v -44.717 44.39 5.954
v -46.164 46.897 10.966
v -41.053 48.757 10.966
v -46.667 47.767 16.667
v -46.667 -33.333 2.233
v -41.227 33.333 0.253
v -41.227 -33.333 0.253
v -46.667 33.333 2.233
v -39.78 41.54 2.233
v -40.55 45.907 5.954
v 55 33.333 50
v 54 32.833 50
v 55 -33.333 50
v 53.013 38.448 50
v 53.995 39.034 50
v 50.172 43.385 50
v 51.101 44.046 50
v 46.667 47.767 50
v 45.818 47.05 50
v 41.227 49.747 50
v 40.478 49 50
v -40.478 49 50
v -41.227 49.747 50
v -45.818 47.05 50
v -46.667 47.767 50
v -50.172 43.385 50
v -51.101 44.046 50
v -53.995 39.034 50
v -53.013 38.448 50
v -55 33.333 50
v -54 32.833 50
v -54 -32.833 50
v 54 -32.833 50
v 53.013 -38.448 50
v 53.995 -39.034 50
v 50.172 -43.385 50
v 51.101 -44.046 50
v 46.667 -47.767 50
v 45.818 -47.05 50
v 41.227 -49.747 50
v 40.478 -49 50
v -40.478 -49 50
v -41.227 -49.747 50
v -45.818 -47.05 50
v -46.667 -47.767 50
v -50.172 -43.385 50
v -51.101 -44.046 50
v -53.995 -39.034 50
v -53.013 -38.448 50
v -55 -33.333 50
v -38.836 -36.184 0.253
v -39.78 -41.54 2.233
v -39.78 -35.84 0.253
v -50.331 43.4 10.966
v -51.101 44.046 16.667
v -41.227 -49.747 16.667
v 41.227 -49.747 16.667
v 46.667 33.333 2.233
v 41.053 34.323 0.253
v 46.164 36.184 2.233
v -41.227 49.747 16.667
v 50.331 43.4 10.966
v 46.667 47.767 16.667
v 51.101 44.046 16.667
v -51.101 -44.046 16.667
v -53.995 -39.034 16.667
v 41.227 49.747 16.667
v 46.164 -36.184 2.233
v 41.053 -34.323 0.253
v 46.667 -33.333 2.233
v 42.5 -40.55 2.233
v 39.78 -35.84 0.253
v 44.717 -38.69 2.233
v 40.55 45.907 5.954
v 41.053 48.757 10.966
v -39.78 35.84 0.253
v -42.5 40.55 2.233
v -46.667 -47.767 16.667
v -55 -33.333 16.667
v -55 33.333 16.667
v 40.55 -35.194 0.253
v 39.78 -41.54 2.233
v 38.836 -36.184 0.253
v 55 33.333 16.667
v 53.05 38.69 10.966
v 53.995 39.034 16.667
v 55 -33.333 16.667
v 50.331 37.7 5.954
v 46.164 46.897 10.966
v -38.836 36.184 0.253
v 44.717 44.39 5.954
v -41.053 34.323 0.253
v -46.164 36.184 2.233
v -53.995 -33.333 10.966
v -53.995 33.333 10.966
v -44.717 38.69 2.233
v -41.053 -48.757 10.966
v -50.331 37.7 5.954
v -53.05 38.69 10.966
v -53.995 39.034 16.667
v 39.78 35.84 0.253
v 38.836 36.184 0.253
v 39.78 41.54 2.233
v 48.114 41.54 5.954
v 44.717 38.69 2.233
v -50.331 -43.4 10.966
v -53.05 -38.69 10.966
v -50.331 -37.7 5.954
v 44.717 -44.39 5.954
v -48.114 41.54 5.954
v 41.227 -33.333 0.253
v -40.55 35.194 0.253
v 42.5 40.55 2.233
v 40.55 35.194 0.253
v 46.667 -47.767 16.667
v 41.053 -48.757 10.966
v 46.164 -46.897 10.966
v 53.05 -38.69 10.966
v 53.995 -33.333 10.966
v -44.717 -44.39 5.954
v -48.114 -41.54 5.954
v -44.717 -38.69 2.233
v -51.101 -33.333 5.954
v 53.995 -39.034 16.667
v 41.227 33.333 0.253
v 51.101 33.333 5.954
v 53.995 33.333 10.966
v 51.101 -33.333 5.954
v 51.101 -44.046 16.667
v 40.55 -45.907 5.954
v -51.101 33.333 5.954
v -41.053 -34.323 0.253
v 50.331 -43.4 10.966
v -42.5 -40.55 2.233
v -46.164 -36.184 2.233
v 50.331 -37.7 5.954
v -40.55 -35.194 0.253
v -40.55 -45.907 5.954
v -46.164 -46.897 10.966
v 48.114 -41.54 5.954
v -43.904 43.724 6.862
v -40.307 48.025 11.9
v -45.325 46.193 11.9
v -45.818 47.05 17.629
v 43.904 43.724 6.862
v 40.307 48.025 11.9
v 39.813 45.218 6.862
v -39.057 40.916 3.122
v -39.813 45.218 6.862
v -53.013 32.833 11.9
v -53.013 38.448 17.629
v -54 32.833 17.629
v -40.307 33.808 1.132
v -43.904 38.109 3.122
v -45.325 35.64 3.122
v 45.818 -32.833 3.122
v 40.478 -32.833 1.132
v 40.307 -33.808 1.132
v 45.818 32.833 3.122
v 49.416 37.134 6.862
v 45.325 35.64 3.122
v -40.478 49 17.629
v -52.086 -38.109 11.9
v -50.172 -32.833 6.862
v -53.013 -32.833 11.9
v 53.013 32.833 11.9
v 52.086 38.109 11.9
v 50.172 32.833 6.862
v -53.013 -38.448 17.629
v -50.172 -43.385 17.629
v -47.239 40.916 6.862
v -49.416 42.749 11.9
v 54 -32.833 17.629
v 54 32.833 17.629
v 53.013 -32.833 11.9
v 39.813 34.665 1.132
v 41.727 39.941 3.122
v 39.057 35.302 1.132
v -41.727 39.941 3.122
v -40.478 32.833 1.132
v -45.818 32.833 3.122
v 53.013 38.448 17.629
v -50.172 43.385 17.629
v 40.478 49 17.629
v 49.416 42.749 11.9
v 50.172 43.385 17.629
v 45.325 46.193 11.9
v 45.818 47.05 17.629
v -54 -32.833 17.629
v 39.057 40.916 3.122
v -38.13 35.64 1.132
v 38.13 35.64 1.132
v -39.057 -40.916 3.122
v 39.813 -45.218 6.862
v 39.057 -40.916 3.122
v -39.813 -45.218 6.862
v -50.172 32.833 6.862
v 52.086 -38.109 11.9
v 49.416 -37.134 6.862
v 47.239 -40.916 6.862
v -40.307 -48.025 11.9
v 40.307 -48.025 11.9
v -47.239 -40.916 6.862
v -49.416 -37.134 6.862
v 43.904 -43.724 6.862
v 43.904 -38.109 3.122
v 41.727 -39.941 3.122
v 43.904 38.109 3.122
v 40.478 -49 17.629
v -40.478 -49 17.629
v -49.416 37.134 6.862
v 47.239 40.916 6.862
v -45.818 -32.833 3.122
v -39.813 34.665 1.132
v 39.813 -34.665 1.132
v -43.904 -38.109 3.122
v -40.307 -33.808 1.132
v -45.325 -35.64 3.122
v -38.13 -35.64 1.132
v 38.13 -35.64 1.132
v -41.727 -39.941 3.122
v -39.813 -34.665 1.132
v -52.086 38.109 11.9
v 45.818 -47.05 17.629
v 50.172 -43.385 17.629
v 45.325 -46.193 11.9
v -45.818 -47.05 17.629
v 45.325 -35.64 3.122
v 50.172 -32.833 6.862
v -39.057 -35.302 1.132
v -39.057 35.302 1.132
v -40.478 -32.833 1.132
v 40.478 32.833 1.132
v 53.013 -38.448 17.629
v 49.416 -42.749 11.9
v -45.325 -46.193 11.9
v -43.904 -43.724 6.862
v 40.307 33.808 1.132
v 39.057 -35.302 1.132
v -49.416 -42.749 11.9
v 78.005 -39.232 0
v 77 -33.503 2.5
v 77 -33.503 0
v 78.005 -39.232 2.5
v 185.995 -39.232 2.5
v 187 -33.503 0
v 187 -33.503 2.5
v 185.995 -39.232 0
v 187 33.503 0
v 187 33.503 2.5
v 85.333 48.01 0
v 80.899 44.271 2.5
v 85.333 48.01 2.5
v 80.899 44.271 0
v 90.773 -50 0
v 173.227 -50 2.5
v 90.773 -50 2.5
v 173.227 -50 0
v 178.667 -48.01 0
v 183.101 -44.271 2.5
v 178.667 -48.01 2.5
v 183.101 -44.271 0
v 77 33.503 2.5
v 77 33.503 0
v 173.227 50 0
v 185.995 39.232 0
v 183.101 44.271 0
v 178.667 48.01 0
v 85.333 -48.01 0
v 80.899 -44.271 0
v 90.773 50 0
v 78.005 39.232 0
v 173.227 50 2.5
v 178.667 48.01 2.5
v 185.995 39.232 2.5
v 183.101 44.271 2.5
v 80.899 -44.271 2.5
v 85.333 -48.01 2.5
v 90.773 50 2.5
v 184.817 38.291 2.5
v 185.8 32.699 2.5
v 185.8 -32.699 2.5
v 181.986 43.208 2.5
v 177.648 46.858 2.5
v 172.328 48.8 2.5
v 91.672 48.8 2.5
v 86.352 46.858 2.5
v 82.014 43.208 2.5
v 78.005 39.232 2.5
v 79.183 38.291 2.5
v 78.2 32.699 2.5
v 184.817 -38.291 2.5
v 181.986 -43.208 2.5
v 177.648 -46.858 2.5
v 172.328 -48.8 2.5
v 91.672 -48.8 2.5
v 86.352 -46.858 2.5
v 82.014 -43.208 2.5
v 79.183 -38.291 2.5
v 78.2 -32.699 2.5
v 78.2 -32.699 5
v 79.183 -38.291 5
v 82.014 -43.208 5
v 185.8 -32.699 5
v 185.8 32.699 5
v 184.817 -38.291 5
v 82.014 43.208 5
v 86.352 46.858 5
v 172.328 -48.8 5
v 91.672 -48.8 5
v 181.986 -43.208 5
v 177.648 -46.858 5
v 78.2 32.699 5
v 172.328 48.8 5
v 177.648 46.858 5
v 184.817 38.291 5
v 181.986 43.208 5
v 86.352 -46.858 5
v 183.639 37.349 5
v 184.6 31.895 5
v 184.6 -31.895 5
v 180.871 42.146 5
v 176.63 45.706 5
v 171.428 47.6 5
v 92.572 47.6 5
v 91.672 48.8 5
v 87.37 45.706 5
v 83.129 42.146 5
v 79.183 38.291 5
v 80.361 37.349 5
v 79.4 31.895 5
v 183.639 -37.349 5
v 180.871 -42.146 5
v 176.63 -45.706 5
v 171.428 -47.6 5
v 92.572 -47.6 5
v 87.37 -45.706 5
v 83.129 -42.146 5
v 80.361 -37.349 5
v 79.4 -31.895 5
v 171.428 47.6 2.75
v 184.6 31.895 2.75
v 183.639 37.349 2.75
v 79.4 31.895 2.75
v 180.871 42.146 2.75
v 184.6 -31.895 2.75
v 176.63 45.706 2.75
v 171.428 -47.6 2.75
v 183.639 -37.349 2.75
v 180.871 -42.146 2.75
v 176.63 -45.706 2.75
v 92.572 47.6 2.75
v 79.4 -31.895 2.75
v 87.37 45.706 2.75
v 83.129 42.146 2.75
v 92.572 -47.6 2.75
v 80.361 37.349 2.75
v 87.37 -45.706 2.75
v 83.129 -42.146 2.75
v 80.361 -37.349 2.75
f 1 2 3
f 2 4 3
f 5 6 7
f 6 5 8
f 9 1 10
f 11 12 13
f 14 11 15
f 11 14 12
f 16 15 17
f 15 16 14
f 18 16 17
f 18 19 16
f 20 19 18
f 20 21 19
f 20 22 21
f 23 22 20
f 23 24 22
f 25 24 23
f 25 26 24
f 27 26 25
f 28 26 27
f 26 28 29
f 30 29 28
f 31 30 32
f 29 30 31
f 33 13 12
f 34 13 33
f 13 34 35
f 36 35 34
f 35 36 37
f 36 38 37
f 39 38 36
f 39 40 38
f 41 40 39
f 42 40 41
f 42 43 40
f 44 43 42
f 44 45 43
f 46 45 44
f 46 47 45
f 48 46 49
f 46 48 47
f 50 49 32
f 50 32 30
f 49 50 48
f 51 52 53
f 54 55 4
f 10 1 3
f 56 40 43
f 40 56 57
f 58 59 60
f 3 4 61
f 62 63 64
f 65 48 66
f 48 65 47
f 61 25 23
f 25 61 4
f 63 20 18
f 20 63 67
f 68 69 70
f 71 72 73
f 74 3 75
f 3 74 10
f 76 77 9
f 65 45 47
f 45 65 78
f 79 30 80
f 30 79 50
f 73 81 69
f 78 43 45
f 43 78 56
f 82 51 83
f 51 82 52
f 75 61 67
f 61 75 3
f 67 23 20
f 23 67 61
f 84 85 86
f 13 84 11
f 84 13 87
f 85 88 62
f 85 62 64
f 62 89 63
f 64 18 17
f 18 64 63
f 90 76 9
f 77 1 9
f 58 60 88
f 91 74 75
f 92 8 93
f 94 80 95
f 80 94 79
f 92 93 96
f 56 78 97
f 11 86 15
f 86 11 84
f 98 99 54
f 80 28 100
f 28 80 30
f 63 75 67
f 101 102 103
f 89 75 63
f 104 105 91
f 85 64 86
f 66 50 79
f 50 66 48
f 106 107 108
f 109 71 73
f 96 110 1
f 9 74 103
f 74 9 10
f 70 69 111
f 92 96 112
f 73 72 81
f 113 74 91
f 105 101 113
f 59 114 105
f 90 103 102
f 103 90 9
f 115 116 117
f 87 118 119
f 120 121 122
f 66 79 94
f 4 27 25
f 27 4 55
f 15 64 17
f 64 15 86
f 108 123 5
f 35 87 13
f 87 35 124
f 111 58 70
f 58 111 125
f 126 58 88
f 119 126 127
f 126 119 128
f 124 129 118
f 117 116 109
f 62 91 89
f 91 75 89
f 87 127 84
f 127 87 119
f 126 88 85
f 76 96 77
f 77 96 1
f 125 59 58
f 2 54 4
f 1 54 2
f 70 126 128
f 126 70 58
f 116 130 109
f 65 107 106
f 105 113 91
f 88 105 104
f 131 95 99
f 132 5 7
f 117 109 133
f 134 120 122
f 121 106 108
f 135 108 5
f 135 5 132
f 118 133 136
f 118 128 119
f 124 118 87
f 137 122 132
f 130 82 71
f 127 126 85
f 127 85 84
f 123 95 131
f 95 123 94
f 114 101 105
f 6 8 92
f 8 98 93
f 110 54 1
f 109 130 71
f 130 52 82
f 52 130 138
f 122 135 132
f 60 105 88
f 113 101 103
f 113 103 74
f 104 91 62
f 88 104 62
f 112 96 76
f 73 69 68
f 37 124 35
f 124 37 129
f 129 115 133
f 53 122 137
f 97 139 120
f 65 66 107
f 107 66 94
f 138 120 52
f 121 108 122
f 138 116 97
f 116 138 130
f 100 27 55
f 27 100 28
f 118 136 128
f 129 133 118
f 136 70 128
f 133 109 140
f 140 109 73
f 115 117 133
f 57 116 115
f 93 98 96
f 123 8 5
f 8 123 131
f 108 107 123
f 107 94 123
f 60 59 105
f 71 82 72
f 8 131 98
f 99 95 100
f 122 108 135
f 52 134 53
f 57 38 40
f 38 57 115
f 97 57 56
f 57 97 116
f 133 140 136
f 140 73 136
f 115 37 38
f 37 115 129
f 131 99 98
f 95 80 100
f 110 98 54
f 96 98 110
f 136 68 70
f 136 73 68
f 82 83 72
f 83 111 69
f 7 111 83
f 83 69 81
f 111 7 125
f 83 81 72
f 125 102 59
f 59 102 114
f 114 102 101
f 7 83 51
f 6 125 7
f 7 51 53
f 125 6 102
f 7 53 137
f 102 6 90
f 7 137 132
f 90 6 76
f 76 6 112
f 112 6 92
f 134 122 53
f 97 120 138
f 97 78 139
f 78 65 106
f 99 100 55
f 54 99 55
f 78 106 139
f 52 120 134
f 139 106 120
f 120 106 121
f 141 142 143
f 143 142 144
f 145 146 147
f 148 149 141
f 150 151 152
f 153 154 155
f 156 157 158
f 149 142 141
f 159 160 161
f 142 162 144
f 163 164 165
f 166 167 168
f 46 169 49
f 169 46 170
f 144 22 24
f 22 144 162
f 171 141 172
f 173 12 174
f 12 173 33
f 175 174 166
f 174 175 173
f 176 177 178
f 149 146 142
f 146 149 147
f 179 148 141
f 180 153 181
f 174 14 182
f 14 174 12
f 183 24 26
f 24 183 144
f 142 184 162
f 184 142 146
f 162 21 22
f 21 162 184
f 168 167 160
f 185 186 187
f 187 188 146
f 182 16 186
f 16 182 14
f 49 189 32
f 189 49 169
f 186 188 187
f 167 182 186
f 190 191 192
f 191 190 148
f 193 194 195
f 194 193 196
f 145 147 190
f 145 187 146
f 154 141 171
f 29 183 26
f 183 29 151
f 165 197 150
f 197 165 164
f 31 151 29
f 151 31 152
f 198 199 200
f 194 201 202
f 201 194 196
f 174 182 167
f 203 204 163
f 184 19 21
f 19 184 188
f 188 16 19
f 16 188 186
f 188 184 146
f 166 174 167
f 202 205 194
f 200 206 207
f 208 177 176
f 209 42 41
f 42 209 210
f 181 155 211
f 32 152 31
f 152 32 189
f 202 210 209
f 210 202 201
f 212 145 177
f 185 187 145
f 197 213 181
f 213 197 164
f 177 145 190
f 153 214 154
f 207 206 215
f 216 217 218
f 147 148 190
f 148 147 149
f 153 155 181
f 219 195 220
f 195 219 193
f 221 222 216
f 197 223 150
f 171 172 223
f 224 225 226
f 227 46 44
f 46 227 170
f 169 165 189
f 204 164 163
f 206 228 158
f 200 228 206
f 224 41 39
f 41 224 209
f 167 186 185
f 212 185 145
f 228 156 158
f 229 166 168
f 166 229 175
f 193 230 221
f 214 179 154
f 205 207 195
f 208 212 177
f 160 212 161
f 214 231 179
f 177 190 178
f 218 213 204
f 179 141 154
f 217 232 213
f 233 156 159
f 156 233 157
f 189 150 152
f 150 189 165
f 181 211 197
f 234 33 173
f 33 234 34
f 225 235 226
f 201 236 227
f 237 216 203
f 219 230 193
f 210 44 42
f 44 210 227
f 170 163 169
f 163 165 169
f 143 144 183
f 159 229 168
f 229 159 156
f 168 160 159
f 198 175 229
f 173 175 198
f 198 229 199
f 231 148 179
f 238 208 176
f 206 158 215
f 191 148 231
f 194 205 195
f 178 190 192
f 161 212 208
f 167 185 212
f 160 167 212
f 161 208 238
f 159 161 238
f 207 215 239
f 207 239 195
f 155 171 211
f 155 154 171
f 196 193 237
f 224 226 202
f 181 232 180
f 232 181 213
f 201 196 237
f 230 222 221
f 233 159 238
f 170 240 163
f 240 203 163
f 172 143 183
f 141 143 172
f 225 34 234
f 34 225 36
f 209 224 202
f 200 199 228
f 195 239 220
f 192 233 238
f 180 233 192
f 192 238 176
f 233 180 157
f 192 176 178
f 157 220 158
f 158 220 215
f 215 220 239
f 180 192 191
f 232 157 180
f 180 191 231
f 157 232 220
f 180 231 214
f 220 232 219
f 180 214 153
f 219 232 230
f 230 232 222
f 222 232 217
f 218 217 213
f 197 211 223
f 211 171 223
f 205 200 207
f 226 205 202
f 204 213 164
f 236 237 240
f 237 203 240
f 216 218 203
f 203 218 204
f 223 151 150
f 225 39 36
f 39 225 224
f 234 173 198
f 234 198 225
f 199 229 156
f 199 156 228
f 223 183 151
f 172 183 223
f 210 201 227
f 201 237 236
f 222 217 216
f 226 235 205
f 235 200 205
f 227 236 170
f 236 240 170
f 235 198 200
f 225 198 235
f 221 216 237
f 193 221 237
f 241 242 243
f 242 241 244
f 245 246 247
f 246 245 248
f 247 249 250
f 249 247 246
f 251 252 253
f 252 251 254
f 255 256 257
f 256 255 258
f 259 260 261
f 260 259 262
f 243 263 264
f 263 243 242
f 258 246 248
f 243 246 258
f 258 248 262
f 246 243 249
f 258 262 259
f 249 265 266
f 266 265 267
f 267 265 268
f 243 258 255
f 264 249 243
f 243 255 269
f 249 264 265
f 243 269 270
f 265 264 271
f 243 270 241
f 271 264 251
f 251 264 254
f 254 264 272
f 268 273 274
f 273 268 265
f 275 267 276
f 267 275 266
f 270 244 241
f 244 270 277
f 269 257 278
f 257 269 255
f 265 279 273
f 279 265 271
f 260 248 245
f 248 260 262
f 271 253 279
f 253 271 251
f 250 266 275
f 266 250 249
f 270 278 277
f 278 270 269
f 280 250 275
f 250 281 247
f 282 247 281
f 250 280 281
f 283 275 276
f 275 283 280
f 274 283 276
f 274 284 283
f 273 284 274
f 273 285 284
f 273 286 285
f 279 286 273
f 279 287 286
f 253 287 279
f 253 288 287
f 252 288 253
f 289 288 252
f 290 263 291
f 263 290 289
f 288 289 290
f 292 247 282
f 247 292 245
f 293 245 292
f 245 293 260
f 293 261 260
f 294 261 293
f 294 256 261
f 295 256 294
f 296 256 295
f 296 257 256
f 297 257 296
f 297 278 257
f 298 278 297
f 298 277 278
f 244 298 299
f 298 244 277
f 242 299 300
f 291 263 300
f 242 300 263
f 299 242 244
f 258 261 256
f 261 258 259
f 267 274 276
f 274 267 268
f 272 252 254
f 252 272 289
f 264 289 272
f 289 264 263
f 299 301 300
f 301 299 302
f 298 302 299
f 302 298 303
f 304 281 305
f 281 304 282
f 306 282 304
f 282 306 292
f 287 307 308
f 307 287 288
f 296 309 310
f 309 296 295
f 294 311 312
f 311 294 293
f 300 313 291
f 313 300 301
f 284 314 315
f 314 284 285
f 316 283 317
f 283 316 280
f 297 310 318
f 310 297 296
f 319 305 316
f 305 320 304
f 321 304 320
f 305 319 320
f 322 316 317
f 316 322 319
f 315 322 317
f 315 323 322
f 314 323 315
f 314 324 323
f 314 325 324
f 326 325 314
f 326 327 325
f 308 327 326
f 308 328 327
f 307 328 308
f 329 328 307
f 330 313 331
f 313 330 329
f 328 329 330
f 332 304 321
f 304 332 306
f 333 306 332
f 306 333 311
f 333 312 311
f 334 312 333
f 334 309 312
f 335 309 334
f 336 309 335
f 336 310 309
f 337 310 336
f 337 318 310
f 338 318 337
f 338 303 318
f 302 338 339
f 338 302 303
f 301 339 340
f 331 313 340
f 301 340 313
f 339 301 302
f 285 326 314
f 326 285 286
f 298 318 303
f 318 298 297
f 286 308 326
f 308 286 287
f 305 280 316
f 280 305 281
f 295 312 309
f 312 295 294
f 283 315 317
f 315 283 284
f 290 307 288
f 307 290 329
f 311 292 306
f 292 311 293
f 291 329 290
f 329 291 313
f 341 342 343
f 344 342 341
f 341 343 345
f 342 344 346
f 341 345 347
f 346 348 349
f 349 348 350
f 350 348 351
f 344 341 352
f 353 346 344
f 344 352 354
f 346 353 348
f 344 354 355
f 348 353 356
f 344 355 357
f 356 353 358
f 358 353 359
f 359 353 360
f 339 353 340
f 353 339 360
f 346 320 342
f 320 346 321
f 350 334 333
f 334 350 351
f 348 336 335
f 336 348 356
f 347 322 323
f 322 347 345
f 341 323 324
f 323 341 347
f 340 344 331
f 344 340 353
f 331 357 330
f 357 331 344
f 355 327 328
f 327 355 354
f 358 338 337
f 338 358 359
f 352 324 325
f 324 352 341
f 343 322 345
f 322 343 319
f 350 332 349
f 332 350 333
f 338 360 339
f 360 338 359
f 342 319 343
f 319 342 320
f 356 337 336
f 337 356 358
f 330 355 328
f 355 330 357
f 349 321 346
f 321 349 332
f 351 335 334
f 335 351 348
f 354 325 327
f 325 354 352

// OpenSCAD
/* [Box Dimensions] */

edge_style = 1; // [1: Rounded, 0: Sharp]

detail = 5; // [1,2,3,4,5,6,7,8,9,10]
$fs = 11 - detail;

// Width
box_width = 110;

// Depth
box_depth = 100;

// Height
box_height = 50;

// Corner radius
radius = 100;


// Wall Thickness
box_thickness = 1;

// Show Box, Lid or both
toggle_display =  0; // [0:Both, 1:Box, 2:Lid]




/* [Lid] */

// Lid Height
lid_height = 5;

// Lid Tolerance
lid_tolerance = 0.2;



/* [Hidden] */

box_radius = min(box_width/3,box_height/3,box_depth/3, radius);

box_size = [box_width,box_depth,box_height];
lid_size = [box_width, box_depth, lid_height];

if(toggle_display != 2) Box(size=box_size, radius=box_radius, wallWidth=box_thickness);
translate([toggle_display!=2 ? box_width*1.2 : 0,0,0]) if(toggle_display!=1) Lid(size=lid_size, wallWidth=box_thickness, radius=box_radius, tolerance=lid_tolerance);
    

module my_cube(size, radius, center, apply_to){
    if(edge_style){
        roundedcube(size=size,radius=radius,center=center,apply_to=apply_to);
    } else {
        cube(size=size,center=center);
    }
}

module Lid(size=[100,50,5], wallWidth=1, radius=5, tolerance=1){
    dw = (wallWidth+tolerance)*2;
    qw = (wallWidth+tolerance)*4;
    translate([0,0,size[2]/2/2])
    difference(){
        union(){
            resize([size[0],size[1],size[2]*0.5])
            my_cube(size=size, radius=radius, apply_to="z", center=true);
            translate([0,0,size[2]*0.5])
            resize([size[0]-dw,size[1]-dw,size[2]*0.5])
            my_cube(size=size, radius=radius, apply_to="z", center=true);
        }
        translate([0,0,size[2]*0.55])
        resize([size[0]-qw,size[1]-qw,size[2]/2])
        my_cube(size=size, radius=radius, apply_to="z", center=true);
        
    }
}

module Box(size=[100,50,30], wallWidth=1, radius=5){
    dw = wallWidth*2;
    translate([0,0,size[2]/2])
    difference(){
        my_cube(size=size, radius=radius, apply_to="zmin", center=true);
        resize([size[0]-dw,size[1]-dw,size[2]])
        translate([0,0,wallWidth])
            my_cube(size=size, radius=radius, apply_to="zmin", center=true);
    }
    
}



module roundedcube(size = [1, 1, 1], center = false, radius = 0.5, apply_to = "all") {
	// If single value, convert to [x, y, z] vector
	size = (size[0] == undef) ? [size, size, size] : size;

	translate_min = radius;
	translate_xmax = size[0] - radius;
	translate_ymax = size[1] - radius;
	translate_zmax = size[2] - radius;

	diameter = radius * 2;

	obj_translate = (center == false) ?
		[0, 0, 0] : [
			-(size[0] / 2),
			-(size[1] / 2),
			-(size[2] / 2)
		];

	translate(v = obj_translate) {
		hull() {
			for (translate_x = [translate_min, translate_xmax]) {
				x_at = (translate_x == translate_min) ? "min" : "max";
				for (translate_y = [translate_min, translate_ymax]) {
					y_at = (translate_y == translate_min) ? "min" : "max";
					for (translate_z = [translate_min, translate_zmax]) {
						z_at = (translate_z == translate_min) ? "min" : "max";

						translate(v = [translate_x, translate_y, translate_z])
						if (
							(apply_to == "all") ||
							(apply_to == "xmin" && x_at == "min") || (apply_to == "xmax" && x_at == "max") ||
							(apply_to == "ymin" && y_at == "min") || (apply_to == "ymax" && y_at == "max") ||
							(apply_to == "zmin" && z_at == "min") || (apply_to == "zmax" && z_at == "max")
						) {
							sphere(r = radius);
						} else {
							rotate = 
								(apply_to == "xmin" || apply_to == "xmax" || apply_to == "x") ? [0, 90, 0] : (
								(apply_to == "ymin" || apply_to == "ymax" || apply_to == "y") ? [90, 90, 0] :
								[0, 0, 0]
							);
							rotate(a = rotate)
							cylinder(h = diameter, r = radius, center = true);
						}
					}
				}
			}
		}
	}
}
